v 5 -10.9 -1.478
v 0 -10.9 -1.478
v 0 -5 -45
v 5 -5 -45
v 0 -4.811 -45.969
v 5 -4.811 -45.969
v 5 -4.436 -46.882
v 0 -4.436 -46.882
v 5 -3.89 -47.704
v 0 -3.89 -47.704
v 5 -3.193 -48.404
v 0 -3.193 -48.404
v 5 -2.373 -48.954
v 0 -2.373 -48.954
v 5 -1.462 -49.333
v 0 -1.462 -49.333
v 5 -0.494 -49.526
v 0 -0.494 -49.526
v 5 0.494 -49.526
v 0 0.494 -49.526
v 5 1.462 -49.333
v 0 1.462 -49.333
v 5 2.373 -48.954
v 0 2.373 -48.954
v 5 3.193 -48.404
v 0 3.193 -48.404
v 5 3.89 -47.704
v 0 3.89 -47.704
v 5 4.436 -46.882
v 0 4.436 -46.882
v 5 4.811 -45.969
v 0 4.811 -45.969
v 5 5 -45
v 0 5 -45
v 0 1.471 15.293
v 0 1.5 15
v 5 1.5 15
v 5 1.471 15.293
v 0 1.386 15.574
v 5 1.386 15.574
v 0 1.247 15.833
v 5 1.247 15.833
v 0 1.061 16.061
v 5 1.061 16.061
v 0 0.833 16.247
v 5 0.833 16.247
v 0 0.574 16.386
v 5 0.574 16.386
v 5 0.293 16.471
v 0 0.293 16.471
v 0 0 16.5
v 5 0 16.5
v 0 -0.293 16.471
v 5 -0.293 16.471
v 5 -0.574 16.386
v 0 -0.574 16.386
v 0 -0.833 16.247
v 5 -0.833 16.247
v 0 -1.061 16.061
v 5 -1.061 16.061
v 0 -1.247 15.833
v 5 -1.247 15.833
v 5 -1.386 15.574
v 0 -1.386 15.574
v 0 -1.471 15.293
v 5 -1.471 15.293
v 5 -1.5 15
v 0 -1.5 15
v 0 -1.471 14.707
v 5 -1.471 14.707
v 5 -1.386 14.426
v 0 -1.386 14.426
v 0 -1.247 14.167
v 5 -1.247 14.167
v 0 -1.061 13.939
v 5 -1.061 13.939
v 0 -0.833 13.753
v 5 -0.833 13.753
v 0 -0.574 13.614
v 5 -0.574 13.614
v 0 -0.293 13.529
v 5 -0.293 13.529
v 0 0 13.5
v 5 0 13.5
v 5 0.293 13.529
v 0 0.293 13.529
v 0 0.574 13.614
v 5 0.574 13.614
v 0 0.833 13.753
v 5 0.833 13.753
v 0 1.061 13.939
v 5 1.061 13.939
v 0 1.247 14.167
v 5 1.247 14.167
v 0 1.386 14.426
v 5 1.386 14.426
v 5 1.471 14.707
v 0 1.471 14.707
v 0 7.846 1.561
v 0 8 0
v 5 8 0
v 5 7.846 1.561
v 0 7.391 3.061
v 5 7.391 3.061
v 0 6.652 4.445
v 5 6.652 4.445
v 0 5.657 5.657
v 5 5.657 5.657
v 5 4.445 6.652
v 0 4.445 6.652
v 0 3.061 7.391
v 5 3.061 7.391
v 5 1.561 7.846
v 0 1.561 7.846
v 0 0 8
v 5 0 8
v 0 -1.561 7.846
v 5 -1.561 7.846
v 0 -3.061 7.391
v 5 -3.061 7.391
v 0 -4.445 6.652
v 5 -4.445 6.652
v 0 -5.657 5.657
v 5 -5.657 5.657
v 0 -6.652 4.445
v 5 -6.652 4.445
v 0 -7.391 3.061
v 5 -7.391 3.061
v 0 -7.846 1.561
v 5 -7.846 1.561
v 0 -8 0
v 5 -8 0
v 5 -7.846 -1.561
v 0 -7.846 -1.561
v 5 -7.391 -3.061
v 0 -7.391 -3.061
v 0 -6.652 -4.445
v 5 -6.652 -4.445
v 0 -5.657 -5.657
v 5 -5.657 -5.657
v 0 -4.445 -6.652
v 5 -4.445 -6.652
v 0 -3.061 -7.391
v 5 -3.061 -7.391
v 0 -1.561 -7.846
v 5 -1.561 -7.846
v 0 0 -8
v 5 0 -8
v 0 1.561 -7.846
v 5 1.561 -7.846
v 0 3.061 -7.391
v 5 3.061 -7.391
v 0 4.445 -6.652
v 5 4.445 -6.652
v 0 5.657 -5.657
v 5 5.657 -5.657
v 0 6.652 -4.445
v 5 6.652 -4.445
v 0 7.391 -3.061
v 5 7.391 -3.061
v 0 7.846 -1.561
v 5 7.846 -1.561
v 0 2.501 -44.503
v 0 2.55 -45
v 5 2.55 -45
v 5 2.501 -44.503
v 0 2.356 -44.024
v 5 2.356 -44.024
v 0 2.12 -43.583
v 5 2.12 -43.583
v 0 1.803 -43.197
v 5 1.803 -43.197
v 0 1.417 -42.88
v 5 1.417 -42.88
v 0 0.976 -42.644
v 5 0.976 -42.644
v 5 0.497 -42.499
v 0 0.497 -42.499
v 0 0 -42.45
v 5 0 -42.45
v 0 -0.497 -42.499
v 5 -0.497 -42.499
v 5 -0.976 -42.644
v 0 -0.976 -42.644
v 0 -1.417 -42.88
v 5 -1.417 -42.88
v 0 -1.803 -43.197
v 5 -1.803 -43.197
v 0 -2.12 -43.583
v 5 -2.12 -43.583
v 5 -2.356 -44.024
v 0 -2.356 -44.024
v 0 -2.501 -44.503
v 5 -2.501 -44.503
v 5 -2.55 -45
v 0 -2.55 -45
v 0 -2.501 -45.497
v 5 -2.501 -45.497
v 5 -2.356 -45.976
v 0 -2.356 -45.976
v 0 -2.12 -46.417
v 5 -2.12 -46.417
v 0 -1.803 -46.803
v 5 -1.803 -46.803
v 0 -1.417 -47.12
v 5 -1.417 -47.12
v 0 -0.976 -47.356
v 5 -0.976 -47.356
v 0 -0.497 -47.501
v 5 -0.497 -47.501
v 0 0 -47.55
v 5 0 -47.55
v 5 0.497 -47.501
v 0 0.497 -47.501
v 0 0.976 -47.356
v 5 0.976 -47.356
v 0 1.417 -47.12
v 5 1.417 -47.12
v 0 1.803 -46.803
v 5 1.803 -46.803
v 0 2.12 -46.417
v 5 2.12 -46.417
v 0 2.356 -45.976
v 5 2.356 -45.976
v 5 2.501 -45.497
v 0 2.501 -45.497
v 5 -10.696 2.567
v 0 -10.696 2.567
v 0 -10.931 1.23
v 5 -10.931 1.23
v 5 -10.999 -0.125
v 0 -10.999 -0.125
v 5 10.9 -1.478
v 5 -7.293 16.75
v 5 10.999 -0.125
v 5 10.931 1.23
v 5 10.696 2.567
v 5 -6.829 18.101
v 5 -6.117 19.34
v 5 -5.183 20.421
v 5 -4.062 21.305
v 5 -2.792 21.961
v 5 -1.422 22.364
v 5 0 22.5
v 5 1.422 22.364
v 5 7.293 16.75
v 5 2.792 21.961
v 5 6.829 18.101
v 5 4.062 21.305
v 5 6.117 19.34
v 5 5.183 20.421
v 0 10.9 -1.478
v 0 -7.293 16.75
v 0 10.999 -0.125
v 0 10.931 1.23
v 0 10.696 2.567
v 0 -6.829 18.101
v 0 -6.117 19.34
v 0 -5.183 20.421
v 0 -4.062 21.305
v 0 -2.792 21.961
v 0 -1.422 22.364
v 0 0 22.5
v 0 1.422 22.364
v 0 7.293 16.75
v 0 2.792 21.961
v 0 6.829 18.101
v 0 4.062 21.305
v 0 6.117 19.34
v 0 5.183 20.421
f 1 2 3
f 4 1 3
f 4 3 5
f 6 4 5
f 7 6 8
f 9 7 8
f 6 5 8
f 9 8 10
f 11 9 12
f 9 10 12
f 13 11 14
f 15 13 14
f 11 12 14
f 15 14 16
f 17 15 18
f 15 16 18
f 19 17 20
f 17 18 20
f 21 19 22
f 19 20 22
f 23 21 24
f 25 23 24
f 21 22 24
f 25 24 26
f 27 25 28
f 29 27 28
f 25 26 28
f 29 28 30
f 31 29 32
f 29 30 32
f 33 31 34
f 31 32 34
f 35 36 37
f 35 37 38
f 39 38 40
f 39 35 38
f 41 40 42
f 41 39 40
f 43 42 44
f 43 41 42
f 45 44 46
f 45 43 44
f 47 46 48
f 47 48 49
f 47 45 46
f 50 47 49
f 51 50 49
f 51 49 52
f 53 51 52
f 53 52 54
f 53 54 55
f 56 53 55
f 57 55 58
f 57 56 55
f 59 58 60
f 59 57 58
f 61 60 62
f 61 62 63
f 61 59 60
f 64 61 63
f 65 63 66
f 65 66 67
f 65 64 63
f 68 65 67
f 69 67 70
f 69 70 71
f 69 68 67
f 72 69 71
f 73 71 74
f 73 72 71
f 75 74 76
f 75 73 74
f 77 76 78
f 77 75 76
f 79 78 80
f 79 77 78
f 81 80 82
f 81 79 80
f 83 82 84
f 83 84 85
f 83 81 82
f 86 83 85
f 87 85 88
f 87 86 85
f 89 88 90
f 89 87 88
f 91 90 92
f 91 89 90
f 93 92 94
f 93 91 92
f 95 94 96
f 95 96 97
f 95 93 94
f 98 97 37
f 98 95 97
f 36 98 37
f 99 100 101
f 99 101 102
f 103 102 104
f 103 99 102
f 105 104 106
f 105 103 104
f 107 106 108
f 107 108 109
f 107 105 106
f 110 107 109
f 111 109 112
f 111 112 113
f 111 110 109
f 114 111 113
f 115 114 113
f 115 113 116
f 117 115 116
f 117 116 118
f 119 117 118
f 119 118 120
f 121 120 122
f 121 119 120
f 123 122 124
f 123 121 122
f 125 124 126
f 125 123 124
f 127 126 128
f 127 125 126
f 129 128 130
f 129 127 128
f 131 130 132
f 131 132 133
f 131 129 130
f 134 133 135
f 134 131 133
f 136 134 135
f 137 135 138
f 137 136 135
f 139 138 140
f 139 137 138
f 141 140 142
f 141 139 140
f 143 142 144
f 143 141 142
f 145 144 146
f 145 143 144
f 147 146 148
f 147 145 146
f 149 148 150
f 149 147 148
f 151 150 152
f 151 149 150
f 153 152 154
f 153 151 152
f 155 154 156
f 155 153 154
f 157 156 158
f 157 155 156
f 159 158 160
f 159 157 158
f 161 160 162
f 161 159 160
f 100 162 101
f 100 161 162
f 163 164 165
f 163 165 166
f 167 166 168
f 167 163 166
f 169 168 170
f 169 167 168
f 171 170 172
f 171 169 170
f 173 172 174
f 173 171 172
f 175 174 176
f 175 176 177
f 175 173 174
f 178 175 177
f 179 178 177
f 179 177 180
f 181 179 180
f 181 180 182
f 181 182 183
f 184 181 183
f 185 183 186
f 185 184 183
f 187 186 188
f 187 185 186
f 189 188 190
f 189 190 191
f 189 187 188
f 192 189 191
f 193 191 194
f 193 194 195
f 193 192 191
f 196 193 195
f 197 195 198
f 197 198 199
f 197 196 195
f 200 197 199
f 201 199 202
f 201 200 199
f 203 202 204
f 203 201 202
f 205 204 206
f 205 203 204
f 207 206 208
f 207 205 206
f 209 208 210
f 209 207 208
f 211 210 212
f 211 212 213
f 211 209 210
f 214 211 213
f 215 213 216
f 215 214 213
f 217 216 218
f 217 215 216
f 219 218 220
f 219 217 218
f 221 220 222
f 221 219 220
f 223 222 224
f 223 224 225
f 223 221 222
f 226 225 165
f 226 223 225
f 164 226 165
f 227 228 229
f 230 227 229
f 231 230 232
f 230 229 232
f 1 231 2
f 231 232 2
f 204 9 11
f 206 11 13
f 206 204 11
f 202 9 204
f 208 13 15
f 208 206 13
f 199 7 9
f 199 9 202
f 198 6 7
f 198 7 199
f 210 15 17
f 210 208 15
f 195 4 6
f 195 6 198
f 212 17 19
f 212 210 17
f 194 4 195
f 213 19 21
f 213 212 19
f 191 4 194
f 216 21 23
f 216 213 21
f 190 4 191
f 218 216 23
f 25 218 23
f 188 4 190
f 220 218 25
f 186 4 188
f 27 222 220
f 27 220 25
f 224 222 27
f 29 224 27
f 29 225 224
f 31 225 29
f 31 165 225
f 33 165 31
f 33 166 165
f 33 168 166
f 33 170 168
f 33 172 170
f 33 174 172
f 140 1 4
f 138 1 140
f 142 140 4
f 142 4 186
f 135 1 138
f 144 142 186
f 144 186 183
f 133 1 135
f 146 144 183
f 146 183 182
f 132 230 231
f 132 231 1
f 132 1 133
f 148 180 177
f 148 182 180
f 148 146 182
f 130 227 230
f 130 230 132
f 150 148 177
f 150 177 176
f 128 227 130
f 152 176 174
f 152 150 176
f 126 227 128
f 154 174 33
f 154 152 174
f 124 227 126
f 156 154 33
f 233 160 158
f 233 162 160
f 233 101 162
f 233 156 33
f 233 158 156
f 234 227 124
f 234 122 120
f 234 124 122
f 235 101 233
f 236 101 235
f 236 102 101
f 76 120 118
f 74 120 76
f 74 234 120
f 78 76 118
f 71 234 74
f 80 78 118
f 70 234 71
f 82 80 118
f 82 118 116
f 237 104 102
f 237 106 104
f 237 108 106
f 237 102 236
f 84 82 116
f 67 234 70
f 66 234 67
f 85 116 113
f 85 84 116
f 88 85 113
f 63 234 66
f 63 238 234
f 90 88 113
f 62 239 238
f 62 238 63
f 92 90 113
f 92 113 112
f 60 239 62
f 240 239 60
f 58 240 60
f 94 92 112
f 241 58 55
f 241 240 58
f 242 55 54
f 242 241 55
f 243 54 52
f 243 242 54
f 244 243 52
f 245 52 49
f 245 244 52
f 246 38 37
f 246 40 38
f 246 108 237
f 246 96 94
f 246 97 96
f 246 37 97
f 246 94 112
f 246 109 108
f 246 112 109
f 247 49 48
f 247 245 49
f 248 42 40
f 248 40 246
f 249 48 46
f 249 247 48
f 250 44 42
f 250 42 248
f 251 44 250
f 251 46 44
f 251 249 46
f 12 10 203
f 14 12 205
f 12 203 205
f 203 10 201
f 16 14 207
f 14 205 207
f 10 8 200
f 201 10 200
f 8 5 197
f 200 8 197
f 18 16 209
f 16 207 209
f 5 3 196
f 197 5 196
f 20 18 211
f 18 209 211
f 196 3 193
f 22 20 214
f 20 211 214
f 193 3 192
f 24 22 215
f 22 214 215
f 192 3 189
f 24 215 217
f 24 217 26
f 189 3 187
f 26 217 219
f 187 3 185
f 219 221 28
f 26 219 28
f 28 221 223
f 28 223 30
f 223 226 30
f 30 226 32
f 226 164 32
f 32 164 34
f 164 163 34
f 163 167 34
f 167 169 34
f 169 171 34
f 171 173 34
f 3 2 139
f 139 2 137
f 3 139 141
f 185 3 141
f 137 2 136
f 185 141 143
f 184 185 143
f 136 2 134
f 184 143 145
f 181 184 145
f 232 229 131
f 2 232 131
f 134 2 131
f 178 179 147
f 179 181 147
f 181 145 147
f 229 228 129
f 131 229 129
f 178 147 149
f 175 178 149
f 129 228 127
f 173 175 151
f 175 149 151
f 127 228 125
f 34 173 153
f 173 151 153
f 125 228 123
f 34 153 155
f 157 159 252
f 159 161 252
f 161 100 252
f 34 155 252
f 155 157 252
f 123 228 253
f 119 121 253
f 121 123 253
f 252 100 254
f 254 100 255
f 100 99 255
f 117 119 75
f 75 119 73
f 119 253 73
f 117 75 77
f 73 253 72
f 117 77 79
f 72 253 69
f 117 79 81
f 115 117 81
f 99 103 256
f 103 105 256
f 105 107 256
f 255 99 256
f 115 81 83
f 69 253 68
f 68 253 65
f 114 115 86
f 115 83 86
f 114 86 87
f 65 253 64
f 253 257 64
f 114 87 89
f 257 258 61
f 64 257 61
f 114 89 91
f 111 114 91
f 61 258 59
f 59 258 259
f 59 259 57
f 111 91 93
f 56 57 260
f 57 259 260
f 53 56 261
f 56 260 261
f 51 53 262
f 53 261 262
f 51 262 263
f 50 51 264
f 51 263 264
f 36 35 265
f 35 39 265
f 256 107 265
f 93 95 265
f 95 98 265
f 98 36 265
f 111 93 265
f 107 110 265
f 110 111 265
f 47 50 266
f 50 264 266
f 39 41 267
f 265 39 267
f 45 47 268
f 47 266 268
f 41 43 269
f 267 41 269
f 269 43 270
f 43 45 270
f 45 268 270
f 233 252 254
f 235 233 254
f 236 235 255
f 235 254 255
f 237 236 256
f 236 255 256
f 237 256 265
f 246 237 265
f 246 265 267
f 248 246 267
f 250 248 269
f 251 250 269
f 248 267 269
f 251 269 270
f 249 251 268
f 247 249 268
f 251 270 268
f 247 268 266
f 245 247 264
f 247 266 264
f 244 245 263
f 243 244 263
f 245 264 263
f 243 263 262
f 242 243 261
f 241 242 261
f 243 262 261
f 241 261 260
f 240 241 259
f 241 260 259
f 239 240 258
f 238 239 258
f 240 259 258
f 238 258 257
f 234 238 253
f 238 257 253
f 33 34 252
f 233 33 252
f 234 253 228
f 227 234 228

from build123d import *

# Parameters (mm, degrees)
F0_R     = 2.55
F0_R_2   = 8
F0_R_3   = 1.5
F1_DEPTH = 5


with BuildPart() as f1:
    # F0 (on Right) → F1 (new body)
    with BuildSketch(Plane.YZ):
        with BuildLine():
            Line((10.696365, 2.566667), (7.292976, 16.75))
            ThreePointArc((7.292976, 16.75), (0, 22.5), (-7.292976, 16.75))
            Line((-7.292976, 16.75), (-10.696365, 2.566667))
            ThreePointArc((-10.696365, 2.566667), (-10.986044, 0.553925), (-10.900287, -1.477746))
            Line((-10.900287, -1.477746), (-5, -45))
            ThreePointArc((-5, -45), (0, -49.55), (5, -45))
            Line((5, -45), (10.900287, -1.477746))
            ThreePointArc((10.900287, -1.477746), (10.986044, 0.553925), (10.696365, 2.566667))
        make_face()
        with Locations((0, -45)):
            Circle(F0_R, mode=Mode.SUBTRACT)
        Circle(F0_R_2, mode=Mode.SUBTRACT)
        with Locations((0, 15)):
            Circle(F0_R_3, mode=Mode.SUBTRACT)
    extrude(amount=F1_DEPTH)


solid = f1.part
